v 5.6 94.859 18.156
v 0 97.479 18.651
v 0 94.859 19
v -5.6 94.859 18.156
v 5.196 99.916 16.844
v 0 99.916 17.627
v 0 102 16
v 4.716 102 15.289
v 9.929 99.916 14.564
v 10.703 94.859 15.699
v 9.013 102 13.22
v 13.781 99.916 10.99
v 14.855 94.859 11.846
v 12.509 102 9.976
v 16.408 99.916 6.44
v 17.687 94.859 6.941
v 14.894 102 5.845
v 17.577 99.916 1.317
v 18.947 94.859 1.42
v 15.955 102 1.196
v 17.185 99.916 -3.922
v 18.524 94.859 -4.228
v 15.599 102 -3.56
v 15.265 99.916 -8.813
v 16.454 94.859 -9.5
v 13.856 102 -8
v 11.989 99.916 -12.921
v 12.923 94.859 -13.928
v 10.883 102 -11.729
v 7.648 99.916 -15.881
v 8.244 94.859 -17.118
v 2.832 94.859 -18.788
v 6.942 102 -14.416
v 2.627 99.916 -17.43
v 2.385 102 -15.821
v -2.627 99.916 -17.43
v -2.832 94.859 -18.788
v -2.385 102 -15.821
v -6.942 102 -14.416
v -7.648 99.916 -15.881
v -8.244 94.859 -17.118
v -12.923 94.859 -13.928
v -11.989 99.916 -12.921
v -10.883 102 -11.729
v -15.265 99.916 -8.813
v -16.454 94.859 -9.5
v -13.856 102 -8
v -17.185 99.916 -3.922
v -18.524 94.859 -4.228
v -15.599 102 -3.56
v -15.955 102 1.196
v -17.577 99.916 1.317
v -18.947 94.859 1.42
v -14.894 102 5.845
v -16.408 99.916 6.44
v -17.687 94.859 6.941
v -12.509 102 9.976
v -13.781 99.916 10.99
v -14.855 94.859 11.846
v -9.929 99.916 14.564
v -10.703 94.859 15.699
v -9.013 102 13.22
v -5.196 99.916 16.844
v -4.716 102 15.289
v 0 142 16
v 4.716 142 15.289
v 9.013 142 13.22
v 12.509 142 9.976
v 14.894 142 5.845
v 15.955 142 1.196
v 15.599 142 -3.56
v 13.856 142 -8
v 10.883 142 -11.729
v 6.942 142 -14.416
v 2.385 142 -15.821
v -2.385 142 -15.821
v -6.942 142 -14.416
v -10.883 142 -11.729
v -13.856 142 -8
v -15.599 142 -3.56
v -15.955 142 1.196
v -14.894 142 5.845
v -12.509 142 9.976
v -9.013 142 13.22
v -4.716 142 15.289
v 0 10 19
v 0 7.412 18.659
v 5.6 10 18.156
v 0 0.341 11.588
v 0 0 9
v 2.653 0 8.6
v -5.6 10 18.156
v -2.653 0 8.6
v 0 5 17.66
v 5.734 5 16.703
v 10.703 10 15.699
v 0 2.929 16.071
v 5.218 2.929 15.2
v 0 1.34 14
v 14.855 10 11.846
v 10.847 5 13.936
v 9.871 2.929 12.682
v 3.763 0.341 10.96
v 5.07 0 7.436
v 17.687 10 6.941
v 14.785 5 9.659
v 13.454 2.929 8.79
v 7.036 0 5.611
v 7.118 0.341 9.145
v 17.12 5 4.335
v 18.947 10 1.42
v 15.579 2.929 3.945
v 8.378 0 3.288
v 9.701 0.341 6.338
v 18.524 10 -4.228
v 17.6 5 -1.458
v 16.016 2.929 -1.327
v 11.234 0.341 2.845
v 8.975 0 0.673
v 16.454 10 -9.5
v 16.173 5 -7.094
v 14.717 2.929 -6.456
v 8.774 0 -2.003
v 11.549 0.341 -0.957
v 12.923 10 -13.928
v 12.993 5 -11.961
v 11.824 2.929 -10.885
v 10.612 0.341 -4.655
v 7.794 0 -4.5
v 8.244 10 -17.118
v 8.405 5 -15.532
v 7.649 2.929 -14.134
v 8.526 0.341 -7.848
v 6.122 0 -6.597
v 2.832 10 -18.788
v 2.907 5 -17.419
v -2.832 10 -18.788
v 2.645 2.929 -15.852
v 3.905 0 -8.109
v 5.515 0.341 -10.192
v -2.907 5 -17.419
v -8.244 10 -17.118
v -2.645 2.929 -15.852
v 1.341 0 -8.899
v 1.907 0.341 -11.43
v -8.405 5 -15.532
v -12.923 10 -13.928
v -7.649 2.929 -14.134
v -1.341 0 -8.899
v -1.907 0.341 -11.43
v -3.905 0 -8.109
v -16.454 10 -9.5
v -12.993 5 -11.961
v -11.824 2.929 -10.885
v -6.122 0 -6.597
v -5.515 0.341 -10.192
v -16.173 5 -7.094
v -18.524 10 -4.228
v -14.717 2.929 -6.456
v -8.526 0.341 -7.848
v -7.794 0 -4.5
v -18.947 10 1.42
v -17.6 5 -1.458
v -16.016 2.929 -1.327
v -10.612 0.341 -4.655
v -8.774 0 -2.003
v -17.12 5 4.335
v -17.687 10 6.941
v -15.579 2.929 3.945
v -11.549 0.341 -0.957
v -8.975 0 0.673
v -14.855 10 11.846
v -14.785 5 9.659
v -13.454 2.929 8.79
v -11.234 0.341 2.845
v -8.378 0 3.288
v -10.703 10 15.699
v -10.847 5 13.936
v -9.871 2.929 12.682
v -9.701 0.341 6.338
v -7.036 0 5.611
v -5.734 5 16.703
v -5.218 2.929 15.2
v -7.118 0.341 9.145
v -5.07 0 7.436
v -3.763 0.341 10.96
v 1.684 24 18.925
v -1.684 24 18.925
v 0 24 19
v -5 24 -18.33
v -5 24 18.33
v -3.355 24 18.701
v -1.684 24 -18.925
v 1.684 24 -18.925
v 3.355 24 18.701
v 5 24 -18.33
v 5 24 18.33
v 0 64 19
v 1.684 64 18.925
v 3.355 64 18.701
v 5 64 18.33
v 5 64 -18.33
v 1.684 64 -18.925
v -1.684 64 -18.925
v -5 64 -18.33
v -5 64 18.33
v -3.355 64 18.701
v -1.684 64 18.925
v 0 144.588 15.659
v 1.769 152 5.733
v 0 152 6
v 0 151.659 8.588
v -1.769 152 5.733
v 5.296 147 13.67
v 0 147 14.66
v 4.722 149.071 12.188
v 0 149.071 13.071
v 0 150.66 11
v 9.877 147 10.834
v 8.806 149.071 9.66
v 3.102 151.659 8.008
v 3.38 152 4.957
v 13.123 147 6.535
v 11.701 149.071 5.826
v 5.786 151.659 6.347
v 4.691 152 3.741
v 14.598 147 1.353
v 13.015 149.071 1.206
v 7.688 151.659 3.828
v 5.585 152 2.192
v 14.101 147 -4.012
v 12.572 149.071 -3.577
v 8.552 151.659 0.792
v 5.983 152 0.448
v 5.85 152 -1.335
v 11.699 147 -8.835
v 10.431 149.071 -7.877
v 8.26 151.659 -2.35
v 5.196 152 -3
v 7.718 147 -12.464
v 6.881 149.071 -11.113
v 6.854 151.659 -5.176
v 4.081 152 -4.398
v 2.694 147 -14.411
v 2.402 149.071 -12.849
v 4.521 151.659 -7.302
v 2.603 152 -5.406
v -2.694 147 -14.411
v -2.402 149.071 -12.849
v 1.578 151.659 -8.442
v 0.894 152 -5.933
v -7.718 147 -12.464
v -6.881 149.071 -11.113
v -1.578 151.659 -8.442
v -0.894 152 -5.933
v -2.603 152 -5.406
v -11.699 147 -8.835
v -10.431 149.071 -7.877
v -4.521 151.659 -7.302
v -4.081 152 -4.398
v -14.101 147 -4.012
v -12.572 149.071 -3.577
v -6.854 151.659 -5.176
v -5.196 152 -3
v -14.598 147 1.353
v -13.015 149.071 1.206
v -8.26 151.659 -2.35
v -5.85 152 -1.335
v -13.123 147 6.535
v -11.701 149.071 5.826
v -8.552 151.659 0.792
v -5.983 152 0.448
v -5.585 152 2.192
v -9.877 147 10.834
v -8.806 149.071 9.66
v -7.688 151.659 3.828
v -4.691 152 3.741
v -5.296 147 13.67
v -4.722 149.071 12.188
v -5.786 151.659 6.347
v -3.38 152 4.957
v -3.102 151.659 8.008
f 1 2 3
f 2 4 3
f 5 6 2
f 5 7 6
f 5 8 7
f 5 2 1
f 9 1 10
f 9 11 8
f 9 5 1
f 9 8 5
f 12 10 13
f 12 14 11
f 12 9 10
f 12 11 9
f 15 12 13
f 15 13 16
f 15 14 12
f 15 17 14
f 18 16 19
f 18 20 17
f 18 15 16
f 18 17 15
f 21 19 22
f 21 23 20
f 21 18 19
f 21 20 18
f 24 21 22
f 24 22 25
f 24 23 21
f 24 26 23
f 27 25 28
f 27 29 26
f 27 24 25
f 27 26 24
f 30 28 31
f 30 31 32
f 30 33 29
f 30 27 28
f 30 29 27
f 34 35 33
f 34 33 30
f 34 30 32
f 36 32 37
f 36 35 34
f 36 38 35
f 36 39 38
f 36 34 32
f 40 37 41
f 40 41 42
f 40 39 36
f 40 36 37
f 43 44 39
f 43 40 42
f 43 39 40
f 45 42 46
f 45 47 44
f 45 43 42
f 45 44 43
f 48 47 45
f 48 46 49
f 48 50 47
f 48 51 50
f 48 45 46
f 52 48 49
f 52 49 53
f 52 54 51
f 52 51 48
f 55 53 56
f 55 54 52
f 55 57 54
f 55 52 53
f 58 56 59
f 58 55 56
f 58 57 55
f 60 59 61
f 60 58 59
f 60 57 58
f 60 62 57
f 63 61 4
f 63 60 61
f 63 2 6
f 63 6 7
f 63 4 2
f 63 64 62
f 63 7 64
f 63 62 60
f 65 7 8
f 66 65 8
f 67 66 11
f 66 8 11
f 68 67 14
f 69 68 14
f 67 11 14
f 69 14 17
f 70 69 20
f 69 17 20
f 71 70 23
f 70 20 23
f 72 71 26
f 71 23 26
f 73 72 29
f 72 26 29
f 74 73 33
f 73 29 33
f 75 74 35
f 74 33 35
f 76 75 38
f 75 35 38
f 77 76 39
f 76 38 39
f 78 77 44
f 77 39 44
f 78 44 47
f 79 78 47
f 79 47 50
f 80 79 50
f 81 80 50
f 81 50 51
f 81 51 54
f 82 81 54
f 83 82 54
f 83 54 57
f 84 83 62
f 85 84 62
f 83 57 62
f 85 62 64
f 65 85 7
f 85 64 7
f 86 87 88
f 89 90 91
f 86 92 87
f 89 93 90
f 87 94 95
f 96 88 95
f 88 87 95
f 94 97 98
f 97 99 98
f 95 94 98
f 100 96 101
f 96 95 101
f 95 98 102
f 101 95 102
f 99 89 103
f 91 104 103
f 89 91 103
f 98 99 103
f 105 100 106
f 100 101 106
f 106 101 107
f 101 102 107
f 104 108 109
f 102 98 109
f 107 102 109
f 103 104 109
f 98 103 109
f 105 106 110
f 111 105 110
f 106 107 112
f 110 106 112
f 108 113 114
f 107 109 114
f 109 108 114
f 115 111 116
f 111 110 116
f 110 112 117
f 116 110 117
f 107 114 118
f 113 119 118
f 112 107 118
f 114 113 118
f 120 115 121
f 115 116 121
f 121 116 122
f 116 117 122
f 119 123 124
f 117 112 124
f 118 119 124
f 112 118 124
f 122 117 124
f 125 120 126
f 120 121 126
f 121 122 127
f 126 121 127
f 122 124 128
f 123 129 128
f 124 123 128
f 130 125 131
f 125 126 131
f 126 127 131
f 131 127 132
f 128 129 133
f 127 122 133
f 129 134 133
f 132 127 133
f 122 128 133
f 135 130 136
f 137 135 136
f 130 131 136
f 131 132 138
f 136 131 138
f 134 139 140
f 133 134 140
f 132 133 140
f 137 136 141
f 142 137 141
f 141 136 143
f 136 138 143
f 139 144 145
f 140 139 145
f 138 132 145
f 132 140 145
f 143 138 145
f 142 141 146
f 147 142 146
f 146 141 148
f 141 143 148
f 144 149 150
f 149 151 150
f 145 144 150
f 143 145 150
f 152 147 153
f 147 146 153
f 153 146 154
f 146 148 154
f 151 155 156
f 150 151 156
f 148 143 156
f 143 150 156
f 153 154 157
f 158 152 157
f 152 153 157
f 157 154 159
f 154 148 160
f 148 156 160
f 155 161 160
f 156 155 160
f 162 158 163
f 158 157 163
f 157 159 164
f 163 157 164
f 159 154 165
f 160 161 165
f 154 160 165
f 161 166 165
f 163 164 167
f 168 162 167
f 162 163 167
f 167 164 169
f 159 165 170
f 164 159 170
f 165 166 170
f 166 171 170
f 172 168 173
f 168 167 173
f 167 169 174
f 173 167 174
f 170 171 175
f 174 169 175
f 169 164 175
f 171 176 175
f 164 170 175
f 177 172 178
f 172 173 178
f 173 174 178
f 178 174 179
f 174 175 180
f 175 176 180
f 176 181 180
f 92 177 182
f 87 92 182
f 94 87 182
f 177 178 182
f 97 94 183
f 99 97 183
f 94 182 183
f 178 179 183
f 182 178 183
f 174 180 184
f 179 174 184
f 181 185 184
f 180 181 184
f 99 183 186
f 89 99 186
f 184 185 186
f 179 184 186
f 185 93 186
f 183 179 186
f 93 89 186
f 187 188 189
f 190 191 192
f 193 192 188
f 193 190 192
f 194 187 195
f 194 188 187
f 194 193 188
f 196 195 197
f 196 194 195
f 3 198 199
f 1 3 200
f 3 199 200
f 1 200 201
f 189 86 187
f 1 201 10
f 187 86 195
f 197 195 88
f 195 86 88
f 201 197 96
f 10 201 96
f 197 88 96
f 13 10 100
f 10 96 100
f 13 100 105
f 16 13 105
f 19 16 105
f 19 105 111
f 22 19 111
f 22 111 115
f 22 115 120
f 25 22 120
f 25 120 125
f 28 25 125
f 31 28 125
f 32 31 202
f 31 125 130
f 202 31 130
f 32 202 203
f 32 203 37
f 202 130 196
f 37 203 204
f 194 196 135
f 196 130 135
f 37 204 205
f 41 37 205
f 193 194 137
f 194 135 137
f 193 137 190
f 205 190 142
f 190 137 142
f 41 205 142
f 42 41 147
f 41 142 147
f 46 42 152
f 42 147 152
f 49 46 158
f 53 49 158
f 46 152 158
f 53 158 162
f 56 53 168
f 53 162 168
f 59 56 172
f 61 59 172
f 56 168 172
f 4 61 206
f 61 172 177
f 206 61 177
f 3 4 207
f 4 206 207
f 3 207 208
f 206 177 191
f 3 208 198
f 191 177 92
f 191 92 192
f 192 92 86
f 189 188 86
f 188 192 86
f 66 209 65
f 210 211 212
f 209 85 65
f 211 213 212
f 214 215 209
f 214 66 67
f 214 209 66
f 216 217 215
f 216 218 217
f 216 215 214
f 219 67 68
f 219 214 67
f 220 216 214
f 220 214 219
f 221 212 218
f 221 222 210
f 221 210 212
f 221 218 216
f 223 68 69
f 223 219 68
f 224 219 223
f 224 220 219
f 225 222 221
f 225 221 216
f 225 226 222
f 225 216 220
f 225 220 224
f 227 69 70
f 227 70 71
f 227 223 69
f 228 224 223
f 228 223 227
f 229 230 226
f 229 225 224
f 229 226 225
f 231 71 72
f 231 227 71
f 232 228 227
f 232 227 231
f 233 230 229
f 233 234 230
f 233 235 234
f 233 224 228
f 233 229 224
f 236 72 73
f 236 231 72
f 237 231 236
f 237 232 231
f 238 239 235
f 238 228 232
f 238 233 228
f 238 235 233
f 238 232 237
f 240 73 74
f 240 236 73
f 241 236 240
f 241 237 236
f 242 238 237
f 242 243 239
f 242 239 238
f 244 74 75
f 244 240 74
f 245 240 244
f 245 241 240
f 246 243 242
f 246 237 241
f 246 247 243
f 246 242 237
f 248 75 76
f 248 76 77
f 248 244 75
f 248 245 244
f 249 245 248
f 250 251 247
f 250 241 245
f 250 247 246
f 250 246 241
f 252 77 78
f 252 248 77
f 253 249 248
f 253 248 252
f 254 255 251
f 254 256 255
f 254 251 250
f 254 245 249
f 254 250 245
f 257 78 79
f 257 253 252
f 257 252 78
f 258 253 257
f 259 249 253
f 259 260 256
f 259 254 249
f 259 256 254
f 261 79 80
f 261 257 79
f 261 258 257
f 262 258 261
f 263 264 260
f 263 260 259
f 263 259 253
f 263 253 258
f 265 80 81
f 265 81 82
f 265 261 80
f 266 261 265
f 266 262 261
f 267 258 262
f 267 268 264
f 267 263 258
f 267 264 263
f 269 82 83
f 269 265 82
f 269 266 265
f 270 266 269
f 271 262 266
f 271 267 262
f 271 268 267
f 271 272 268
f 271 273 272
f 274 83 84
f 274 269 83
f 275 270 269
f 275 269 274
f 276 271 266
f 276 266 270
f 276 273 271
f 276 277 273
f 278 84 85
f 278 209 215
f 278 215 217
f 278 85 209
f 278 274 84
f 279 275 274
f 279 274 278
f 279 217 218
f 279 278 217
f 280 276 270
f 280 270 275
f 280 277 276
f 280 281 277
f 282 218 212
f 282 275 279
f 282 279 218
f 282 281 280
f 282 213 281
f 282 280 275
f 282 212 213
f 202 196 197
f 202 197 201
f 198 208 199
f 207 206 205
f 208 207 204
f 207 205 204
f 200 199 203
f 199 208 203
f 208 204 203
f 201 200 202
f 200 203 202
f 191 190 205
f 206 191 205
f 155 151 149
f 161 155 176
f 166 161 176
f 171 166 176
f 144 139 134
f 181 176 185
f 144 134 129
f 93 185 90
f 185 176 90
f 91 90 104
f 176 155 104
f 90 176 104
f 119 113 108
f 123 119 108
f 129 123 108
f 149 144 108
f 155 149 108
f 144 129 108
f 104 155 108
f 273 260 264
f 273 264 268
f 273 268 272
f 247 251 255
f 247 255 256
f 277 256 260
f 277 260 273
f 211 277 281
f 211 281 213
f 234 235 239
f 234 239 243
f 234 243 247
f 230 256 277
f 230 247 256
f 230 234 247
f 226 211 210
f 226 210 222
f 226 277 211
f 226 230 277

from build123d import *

# Parameters (mm, degrees)
SKETCH1_R               = 19
BOSS_EXTRUDE3_DEPTH     = 102
SKETCH2_R               = 16
BOSS_EXTRUDE4_DEPTH     = 50
FILLET1_R               = 10
FILLET2_R               = 10
FILLET3_R               = 10
CUT_EXTRUDE1_DEPTH      = 155.356729713
CUT_EXTRUDE1_DEPTH_BACK = 155.356729713
SKETCH3_W               = 10
SKETCH3_H               = 40


with BuildPart() as part:
    # Sketch1 → Boss-Extrude3 (new body)
    with BuildSketch(Plane(origin=(0, 0, 0), x_dir=(1, 0, 0), z_dir=(0, 1, 0))):
        with Locations(Location((0, 0, 0), (0, 0, 270))):
            Circle(SKETCH1_R)
    extrude(amount=BOSS_EXTRUDE3_DEPTH)

    # Sketch2 → Boss-Extrude4 (add)
    with BuildSketch(Plane(origin=(0, 102, 0), x_dir=(1, 0, 0), z_dir=(0, 1, 0))):
        with Locations(Location((0, 0, 0), (0, 0, 270))):
            Circle(SKETCH2_R)
    extrude(amount=BOSS_EXTRUDE4_DEPTH)

    # Fillet1
    # the kernel refuses this fillet: 10 mm, written as the material it takes off along each edge
    with BuildSketch(Plane(origin=(0, 102, 0), x_dir=(0, 0, 1), z_dir=(-1, 0, 0))) as fillet1_piece_1:
        with BuildLine():
            CenterArc((9, -7.141428429), FILLET1_R, 0, 45.572995999)
            Line((16, 0), (16.14, 0.142828569))
            ThreePointArc((16.14, 0.142828569), (17.5, 0.2), (19, 0.2))
            Line((19, 0.2), (19.2, 0))
            Line((19.2, 0), (19.2, -7.141428429))
            Line((19.2, -7.141428429), (19, -7.141428429))
        make_face()
    revolve(axis=Axis((0, 102, 0), (0, 1, 0)), mode=Mode.SUBTRACT)

    # Fillet2
    fillet2_edges = [part.edges().sort_by_distance(p)[0] for p in [
        (0, 152, -16),
    ]]
    fillet(fillet2_edges, radius=FILLET2_R)

    # Fillet3
    fillet3_edges = [part.edges().sort_by_distance(p)[0] for p in [
        (0, 0, -19),
    ]]
    fillet(fillet3_edges, radius=FILLET3_R)

    # Sketch3 → Cut-Extrude1 (cut, two sides: drawn at the far end of the back side and taken through both)
    with BuildSketch(Plane.XY.offset(-CUT_EXTRUDE1_DEPTH_BACK)):
        with Locations((0, 44)):
            Rectangle(SKETCH3_W, SKETCH3_H)
    extrude(amount=CUT_EXTRUDE1_DEPTH + CUT_EXTRUDE1_DEPTH_BACK, mode=Mode.SUBTRACT)


solid = part.part
